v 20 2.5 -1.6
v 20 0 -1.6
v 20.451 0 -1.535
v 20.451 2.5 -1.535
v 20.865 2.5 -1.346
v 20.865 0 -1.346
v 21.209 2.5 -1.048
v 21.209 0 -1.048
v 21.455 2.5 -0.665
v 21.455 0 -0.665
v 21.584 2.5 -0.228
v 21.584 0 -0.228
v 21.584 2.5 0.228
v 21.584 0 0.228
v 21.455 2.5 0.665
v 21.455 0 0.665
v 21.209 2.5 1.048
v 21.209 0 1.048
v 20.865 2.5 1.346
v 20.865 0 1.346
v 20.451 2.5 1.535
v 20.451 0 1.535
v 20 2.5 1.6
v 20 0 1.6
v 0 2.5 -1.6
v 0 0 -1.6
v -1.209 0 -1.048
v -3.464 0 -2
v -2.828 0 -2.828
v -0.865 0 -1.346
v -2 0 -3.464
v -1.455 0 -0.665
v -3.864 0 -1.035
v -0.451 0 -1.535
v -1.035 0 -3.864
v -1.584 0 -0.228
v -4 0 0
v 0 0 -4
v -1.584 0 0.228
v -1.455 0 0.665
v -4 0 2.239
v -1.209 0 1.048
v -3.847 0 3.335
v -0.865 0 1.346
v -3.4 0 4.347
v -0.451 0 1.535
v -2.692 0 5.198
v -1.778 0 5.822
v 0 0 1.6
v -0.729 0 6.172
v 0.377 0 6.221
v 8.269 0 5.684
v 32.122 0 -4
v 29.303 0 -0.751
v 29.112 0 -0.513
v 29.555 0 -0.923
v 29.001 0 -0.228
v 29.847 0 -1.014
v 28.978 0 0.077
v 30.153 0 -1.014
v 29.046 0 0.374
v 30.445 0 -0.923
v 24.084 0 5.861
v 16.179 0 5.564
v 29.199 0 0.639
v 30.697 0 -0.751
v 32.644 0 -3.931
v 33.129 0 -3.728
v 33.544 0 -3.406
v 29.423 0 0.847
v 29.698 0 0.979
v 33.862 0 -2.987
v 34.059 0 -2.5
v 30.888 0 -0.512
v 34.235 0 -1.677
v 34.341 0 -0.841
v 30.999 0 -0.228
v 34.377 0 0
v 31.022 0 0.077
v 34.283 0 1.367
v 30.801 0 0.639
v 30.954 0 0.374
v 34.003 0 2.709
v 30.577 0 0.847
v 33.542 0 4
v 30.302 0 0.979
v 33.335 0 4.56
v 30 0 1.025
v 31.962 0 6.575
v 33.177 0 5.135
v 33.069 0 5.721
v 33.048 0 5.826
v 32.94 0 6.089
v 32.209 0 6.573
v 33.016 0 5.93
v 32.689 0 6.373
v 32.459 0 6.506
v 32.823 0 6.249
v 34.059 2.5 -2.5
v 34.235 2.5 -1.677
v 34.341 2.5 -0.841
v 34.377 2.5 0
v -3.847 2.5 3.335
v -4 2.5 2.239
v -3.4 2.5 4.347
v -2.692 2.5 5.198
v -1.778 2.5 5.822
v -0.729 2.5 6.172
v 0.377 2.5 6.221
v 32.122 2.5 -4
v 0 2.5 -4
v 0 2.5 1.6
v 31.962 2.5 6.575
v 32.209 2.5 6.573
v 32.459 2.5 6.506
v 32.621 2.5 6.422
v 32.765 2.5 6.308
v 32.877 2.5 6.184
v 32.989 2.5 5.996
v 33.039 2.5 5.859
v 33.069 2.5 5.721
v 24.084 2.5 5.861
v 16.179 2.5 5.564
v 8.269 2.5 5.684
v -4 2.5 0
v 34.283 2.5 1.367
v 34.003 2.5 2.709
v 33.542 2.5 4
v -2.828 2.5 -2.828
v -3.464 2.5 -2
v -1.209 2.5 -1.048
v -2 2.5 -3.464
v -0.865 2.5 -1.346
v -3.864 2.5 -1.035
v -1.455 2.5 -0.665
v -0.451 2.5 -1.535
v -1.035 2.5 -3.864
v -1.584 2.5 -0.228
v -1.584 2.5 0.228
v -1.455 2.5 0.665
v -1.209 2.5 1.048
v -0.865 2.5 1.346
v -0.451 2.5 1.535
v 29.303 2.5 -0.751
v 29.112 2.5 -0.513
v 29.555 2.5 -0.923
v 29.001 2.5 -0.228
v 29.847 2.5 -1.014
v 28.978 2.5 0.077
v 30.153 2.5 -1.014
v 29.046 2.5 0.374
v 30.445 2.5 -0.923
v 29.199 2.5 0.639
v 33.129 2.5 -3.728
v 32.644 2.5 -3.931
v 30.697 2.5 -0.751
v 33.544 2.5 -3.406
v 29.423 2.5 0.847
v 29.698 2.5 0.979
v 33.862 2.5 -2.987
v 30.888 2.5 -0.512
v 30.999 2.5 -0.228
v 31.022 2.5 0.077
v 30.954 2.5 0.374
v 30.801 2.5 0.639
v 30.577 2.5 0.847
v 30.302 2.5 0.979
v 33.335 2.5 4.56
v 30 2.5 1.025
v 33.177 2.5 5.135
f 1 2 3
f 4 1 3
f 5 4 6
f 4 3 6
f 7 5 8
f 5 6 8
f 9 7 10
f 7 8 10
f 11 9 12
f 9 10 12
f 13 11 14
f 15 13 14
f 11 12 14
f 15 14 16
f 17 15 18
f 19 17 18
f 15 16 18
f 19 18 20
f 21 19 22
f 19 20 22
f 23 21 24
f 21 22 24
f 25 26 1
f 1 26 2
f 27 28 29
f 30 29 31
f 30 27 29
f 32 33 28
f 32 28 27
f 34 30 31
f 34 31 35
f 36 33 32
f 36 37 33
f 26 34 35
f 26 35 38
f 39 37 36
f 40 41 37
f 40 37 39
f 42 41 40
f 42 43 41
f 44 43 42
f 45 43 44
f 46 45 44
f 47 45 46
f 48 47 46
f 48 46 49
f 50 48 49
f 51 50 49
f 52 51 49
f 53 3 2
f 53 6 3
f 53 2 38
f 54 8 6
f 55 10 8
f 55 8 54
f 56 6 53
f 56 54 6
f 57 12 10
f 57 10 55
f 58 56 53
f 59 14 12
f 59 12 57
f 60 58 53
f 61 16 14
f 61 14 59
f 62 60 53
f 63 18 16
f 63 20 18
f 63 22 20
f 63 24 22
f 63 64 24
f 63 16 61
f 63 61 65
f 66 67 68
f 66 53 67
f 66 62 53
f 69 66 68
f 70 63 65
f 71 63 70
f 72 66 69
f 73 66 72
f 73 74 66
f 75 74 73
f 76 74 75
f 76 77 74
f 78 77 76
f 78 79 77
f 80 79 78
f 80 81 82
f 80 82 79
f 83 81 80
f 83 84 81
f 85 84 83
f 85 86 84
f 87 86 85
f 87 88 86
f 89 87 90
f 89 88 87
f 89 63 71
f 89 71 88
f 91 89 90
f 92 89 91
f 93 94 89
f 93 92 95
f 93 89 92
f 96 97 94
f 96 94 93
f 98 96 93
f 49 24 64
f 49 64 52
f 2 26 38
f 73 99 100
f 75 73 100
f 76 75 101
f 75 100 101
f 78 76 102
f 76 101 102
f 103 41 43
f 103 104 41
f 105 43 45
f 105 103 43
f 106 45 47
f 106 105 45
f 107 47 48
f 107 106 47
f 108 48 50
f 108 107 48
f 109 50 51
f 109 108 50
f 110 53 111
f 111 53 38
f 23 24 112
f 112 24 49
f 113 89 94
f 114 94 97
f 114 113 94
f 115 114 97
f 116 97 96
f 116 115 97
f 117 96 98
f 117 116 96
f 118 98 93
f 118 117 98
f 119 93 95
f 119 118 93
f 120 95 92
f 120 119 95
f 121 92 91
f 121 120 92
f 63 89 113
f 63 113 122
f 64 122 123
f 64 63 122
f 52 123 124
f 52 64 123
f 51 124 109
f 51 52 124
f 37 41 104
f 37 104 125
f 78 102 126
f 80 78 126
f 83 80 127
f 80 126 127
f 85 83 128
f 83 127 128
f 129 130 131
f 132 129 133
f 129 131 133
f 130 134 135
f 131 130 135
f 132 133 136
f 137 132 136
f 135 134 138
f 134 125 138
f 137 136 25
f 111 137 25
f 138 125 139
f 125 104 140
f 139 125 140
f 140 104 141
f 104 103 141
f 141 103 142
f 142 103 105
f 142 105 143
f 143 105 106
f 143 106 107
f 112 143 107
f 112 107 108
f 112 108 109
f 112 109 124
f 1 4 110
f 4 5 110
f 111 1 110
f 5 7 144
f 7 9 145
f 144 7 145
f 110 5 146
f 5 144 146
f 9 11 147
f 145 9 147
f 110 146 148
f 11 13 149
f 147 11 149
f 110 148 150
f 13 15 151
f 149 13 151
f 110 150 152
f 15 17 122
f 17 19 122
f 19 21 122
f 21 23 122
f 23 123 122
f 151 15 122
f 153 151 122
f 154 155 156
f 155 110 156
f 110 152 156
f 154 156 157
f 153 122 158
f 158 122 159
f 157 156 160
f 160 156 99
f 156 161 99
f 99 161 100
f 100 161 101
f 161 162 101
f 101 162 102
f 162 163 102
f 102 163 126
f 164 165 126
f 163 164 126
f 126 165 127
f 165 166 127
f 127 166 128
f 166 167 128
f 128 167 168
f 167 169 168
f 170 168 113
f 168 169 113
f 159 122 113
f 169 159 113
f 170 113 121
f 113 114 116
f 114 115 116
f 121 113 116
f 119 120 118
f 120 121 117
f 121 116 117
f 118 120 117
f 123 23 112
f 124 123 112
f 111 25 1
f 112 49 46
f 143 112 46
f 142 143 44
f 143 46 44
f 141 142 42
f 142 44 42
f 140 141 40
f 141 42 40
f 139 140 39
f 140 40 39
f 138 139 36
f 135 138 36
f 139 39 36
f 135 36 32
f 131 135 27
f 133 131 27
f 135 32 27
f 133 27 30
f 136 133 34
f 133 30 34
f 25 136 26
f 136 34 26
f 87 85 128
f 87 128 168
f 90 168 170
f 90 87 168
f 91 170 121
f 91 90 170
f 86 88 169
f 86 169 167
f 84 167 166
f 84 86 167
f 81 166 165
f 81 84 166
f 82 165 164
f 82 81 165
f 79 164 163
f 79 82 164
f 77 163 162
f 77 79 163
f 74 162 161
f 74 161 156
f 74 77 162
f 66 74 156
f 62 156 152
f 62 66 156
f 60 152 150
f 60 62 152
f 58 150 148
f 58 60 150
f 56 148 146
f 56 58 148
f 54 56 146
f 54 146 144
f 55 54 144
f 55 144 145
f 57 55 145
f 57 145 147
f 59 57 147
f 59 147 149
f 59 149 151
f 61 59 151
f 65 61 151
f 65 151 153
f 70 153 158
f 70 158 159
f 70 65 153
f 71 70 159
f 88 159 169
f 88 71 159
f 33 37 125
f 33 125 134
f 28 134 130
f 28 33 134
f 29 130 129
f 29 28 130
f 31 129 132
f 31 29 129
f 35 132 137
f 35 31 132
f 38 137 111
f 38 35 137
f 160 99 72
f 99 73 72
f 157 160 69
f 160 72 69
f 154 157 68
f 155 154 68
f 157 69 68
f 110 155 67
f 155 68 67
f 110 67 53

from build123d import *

# Parameters (mm, degrees)
SKETCH_1_R          = 1.025
EXTRUDE_1_DEPTH     = 2.5
EXTRUDE_3_DEPTH     = 2.5
EXTRUDE_2_DEPTH     = 2.5
FILLET_1_R          = 4
CUT_EXTRUDE_1_DEPTH = 2.5
FILLET_3_R          = 1
FILLET_4_R          = 2


with BuildPart() as part:
    # 草图1 → 凸台-拉伸1 (new body)
    with BuildSketch(Plane(origin=(0, 0, 0), x_dir=(1, 0, 0), z_dir=(0, 1, 0))):
        with BuildLine():
            Line((0, 4), (30, 4))
            ThreePointArc((30, 4), (34, 0), (30, -4))
            Line((30, -4), (0, -4))
            ThreePointArc((0, -4), (-4, 0), (0, 4))
        make_face()
        with Locations(Location((30, 0, 0), (0, 0, 270))):
            Circle(SKETCH_1_R, mode=Mode.SUBTRACT)
        with BuildLine():
            Line((0, 1.6), (20, 1.6))
            ThreePointArc((20, 1.6), (21.6, 0), (20, -1.6))
            Line((20, -1.6), (0, -1.6))
            ThreePointArc((0, -1.6), (-1.6, 0), (0, 1.6))
        make_face(mode=Mode.SUBTRACT)
    extrude(amount=EXTRUDE_1_DEPTH)

    # 草图4 → 凸台-拉伸3 (add)
    with BuildSketch(Plane(origin=(0, 0, 0), x_dir=(1, 0, 0), z_dir=(0, 1, 0))):
        with BuildLine():
            Line((35, 4), (30, 4))
            ThreePointArc((30, 4), (34, 0), (30, -4))
            Line((30, -4), (35, -4))
            Line((35, -4), (35, 4))
        make_face()
    extrude(amount=EXTRUDE_3_DEPTH)

    # 草图2 → 凸台-拉伸2 (add)
    with BuildSketch(Plane.XZ):
        with BuildLine():
            Line((-4, 6.7), (-4, 0))
            ThreePointArc((-4, 0), (-2.828427125, 2.828427125), (0, 4))
            Line((0, 4), (33.541672043, 4))
            ThreePointArc((33.541672043, 4), (33.13675384, 5.32310053), (33, 6.7))
            ThreePointArc((33, 6.7), (14.5, 5.554795019), (-4, 6.7))
        make_face()
    extrude(amount=-EXTRUDE_2_DEPTH)

    # 圆角1
    fillet_1_edges = [part.edges().sort_by_distance(p)[0] for p in [
        (-4, 1.25, 6.7),
    ]]
    fillet(fillet_1_edges, radius=FILLET_1_R)

    # 草图5 → 切除-拉伸1 (cut)
    with BuildSketch(Plane(origin=(0, 2.5, 0), x_dir=(1, 0, 0), z_dir=(0, 1, 0))):
        with BuildLine():
            ThreePointArc((34.376520653, 0), (34.165583782, -2.043096437), (33.541672043, -4))
            Line((33.541672043, -4), (35, -4))
            Line((35, -4), (35, 4))
            Line((35, 4), (33.541672043, 4))
            ThreePointArc((33.541672043, 4), (34.165583782, 2.043096437), (34.376520653, 0))
        make_face()
    extrude(amount=-CUT_EXTRUDE_1_DEPTH, mode=Mode.SUBTRACT)

    # 圆角3
    fillet_3_edges = [part.edges().sort_by_distance(p)[0] for p in [
        (33, 1.25, 6.7),
    ]]
    fillet(fillet_3_edges, radius=FILLET_3_R)

    # 圆角4
    fillet_4_edges = [part.edges().sort_by_distance(p)[0] for p in [
        (33.541672043, 1.25, -4),
    ]]
    fillet(fillet_4_edges, radius=FILLET_4_R)


solid = part.part
